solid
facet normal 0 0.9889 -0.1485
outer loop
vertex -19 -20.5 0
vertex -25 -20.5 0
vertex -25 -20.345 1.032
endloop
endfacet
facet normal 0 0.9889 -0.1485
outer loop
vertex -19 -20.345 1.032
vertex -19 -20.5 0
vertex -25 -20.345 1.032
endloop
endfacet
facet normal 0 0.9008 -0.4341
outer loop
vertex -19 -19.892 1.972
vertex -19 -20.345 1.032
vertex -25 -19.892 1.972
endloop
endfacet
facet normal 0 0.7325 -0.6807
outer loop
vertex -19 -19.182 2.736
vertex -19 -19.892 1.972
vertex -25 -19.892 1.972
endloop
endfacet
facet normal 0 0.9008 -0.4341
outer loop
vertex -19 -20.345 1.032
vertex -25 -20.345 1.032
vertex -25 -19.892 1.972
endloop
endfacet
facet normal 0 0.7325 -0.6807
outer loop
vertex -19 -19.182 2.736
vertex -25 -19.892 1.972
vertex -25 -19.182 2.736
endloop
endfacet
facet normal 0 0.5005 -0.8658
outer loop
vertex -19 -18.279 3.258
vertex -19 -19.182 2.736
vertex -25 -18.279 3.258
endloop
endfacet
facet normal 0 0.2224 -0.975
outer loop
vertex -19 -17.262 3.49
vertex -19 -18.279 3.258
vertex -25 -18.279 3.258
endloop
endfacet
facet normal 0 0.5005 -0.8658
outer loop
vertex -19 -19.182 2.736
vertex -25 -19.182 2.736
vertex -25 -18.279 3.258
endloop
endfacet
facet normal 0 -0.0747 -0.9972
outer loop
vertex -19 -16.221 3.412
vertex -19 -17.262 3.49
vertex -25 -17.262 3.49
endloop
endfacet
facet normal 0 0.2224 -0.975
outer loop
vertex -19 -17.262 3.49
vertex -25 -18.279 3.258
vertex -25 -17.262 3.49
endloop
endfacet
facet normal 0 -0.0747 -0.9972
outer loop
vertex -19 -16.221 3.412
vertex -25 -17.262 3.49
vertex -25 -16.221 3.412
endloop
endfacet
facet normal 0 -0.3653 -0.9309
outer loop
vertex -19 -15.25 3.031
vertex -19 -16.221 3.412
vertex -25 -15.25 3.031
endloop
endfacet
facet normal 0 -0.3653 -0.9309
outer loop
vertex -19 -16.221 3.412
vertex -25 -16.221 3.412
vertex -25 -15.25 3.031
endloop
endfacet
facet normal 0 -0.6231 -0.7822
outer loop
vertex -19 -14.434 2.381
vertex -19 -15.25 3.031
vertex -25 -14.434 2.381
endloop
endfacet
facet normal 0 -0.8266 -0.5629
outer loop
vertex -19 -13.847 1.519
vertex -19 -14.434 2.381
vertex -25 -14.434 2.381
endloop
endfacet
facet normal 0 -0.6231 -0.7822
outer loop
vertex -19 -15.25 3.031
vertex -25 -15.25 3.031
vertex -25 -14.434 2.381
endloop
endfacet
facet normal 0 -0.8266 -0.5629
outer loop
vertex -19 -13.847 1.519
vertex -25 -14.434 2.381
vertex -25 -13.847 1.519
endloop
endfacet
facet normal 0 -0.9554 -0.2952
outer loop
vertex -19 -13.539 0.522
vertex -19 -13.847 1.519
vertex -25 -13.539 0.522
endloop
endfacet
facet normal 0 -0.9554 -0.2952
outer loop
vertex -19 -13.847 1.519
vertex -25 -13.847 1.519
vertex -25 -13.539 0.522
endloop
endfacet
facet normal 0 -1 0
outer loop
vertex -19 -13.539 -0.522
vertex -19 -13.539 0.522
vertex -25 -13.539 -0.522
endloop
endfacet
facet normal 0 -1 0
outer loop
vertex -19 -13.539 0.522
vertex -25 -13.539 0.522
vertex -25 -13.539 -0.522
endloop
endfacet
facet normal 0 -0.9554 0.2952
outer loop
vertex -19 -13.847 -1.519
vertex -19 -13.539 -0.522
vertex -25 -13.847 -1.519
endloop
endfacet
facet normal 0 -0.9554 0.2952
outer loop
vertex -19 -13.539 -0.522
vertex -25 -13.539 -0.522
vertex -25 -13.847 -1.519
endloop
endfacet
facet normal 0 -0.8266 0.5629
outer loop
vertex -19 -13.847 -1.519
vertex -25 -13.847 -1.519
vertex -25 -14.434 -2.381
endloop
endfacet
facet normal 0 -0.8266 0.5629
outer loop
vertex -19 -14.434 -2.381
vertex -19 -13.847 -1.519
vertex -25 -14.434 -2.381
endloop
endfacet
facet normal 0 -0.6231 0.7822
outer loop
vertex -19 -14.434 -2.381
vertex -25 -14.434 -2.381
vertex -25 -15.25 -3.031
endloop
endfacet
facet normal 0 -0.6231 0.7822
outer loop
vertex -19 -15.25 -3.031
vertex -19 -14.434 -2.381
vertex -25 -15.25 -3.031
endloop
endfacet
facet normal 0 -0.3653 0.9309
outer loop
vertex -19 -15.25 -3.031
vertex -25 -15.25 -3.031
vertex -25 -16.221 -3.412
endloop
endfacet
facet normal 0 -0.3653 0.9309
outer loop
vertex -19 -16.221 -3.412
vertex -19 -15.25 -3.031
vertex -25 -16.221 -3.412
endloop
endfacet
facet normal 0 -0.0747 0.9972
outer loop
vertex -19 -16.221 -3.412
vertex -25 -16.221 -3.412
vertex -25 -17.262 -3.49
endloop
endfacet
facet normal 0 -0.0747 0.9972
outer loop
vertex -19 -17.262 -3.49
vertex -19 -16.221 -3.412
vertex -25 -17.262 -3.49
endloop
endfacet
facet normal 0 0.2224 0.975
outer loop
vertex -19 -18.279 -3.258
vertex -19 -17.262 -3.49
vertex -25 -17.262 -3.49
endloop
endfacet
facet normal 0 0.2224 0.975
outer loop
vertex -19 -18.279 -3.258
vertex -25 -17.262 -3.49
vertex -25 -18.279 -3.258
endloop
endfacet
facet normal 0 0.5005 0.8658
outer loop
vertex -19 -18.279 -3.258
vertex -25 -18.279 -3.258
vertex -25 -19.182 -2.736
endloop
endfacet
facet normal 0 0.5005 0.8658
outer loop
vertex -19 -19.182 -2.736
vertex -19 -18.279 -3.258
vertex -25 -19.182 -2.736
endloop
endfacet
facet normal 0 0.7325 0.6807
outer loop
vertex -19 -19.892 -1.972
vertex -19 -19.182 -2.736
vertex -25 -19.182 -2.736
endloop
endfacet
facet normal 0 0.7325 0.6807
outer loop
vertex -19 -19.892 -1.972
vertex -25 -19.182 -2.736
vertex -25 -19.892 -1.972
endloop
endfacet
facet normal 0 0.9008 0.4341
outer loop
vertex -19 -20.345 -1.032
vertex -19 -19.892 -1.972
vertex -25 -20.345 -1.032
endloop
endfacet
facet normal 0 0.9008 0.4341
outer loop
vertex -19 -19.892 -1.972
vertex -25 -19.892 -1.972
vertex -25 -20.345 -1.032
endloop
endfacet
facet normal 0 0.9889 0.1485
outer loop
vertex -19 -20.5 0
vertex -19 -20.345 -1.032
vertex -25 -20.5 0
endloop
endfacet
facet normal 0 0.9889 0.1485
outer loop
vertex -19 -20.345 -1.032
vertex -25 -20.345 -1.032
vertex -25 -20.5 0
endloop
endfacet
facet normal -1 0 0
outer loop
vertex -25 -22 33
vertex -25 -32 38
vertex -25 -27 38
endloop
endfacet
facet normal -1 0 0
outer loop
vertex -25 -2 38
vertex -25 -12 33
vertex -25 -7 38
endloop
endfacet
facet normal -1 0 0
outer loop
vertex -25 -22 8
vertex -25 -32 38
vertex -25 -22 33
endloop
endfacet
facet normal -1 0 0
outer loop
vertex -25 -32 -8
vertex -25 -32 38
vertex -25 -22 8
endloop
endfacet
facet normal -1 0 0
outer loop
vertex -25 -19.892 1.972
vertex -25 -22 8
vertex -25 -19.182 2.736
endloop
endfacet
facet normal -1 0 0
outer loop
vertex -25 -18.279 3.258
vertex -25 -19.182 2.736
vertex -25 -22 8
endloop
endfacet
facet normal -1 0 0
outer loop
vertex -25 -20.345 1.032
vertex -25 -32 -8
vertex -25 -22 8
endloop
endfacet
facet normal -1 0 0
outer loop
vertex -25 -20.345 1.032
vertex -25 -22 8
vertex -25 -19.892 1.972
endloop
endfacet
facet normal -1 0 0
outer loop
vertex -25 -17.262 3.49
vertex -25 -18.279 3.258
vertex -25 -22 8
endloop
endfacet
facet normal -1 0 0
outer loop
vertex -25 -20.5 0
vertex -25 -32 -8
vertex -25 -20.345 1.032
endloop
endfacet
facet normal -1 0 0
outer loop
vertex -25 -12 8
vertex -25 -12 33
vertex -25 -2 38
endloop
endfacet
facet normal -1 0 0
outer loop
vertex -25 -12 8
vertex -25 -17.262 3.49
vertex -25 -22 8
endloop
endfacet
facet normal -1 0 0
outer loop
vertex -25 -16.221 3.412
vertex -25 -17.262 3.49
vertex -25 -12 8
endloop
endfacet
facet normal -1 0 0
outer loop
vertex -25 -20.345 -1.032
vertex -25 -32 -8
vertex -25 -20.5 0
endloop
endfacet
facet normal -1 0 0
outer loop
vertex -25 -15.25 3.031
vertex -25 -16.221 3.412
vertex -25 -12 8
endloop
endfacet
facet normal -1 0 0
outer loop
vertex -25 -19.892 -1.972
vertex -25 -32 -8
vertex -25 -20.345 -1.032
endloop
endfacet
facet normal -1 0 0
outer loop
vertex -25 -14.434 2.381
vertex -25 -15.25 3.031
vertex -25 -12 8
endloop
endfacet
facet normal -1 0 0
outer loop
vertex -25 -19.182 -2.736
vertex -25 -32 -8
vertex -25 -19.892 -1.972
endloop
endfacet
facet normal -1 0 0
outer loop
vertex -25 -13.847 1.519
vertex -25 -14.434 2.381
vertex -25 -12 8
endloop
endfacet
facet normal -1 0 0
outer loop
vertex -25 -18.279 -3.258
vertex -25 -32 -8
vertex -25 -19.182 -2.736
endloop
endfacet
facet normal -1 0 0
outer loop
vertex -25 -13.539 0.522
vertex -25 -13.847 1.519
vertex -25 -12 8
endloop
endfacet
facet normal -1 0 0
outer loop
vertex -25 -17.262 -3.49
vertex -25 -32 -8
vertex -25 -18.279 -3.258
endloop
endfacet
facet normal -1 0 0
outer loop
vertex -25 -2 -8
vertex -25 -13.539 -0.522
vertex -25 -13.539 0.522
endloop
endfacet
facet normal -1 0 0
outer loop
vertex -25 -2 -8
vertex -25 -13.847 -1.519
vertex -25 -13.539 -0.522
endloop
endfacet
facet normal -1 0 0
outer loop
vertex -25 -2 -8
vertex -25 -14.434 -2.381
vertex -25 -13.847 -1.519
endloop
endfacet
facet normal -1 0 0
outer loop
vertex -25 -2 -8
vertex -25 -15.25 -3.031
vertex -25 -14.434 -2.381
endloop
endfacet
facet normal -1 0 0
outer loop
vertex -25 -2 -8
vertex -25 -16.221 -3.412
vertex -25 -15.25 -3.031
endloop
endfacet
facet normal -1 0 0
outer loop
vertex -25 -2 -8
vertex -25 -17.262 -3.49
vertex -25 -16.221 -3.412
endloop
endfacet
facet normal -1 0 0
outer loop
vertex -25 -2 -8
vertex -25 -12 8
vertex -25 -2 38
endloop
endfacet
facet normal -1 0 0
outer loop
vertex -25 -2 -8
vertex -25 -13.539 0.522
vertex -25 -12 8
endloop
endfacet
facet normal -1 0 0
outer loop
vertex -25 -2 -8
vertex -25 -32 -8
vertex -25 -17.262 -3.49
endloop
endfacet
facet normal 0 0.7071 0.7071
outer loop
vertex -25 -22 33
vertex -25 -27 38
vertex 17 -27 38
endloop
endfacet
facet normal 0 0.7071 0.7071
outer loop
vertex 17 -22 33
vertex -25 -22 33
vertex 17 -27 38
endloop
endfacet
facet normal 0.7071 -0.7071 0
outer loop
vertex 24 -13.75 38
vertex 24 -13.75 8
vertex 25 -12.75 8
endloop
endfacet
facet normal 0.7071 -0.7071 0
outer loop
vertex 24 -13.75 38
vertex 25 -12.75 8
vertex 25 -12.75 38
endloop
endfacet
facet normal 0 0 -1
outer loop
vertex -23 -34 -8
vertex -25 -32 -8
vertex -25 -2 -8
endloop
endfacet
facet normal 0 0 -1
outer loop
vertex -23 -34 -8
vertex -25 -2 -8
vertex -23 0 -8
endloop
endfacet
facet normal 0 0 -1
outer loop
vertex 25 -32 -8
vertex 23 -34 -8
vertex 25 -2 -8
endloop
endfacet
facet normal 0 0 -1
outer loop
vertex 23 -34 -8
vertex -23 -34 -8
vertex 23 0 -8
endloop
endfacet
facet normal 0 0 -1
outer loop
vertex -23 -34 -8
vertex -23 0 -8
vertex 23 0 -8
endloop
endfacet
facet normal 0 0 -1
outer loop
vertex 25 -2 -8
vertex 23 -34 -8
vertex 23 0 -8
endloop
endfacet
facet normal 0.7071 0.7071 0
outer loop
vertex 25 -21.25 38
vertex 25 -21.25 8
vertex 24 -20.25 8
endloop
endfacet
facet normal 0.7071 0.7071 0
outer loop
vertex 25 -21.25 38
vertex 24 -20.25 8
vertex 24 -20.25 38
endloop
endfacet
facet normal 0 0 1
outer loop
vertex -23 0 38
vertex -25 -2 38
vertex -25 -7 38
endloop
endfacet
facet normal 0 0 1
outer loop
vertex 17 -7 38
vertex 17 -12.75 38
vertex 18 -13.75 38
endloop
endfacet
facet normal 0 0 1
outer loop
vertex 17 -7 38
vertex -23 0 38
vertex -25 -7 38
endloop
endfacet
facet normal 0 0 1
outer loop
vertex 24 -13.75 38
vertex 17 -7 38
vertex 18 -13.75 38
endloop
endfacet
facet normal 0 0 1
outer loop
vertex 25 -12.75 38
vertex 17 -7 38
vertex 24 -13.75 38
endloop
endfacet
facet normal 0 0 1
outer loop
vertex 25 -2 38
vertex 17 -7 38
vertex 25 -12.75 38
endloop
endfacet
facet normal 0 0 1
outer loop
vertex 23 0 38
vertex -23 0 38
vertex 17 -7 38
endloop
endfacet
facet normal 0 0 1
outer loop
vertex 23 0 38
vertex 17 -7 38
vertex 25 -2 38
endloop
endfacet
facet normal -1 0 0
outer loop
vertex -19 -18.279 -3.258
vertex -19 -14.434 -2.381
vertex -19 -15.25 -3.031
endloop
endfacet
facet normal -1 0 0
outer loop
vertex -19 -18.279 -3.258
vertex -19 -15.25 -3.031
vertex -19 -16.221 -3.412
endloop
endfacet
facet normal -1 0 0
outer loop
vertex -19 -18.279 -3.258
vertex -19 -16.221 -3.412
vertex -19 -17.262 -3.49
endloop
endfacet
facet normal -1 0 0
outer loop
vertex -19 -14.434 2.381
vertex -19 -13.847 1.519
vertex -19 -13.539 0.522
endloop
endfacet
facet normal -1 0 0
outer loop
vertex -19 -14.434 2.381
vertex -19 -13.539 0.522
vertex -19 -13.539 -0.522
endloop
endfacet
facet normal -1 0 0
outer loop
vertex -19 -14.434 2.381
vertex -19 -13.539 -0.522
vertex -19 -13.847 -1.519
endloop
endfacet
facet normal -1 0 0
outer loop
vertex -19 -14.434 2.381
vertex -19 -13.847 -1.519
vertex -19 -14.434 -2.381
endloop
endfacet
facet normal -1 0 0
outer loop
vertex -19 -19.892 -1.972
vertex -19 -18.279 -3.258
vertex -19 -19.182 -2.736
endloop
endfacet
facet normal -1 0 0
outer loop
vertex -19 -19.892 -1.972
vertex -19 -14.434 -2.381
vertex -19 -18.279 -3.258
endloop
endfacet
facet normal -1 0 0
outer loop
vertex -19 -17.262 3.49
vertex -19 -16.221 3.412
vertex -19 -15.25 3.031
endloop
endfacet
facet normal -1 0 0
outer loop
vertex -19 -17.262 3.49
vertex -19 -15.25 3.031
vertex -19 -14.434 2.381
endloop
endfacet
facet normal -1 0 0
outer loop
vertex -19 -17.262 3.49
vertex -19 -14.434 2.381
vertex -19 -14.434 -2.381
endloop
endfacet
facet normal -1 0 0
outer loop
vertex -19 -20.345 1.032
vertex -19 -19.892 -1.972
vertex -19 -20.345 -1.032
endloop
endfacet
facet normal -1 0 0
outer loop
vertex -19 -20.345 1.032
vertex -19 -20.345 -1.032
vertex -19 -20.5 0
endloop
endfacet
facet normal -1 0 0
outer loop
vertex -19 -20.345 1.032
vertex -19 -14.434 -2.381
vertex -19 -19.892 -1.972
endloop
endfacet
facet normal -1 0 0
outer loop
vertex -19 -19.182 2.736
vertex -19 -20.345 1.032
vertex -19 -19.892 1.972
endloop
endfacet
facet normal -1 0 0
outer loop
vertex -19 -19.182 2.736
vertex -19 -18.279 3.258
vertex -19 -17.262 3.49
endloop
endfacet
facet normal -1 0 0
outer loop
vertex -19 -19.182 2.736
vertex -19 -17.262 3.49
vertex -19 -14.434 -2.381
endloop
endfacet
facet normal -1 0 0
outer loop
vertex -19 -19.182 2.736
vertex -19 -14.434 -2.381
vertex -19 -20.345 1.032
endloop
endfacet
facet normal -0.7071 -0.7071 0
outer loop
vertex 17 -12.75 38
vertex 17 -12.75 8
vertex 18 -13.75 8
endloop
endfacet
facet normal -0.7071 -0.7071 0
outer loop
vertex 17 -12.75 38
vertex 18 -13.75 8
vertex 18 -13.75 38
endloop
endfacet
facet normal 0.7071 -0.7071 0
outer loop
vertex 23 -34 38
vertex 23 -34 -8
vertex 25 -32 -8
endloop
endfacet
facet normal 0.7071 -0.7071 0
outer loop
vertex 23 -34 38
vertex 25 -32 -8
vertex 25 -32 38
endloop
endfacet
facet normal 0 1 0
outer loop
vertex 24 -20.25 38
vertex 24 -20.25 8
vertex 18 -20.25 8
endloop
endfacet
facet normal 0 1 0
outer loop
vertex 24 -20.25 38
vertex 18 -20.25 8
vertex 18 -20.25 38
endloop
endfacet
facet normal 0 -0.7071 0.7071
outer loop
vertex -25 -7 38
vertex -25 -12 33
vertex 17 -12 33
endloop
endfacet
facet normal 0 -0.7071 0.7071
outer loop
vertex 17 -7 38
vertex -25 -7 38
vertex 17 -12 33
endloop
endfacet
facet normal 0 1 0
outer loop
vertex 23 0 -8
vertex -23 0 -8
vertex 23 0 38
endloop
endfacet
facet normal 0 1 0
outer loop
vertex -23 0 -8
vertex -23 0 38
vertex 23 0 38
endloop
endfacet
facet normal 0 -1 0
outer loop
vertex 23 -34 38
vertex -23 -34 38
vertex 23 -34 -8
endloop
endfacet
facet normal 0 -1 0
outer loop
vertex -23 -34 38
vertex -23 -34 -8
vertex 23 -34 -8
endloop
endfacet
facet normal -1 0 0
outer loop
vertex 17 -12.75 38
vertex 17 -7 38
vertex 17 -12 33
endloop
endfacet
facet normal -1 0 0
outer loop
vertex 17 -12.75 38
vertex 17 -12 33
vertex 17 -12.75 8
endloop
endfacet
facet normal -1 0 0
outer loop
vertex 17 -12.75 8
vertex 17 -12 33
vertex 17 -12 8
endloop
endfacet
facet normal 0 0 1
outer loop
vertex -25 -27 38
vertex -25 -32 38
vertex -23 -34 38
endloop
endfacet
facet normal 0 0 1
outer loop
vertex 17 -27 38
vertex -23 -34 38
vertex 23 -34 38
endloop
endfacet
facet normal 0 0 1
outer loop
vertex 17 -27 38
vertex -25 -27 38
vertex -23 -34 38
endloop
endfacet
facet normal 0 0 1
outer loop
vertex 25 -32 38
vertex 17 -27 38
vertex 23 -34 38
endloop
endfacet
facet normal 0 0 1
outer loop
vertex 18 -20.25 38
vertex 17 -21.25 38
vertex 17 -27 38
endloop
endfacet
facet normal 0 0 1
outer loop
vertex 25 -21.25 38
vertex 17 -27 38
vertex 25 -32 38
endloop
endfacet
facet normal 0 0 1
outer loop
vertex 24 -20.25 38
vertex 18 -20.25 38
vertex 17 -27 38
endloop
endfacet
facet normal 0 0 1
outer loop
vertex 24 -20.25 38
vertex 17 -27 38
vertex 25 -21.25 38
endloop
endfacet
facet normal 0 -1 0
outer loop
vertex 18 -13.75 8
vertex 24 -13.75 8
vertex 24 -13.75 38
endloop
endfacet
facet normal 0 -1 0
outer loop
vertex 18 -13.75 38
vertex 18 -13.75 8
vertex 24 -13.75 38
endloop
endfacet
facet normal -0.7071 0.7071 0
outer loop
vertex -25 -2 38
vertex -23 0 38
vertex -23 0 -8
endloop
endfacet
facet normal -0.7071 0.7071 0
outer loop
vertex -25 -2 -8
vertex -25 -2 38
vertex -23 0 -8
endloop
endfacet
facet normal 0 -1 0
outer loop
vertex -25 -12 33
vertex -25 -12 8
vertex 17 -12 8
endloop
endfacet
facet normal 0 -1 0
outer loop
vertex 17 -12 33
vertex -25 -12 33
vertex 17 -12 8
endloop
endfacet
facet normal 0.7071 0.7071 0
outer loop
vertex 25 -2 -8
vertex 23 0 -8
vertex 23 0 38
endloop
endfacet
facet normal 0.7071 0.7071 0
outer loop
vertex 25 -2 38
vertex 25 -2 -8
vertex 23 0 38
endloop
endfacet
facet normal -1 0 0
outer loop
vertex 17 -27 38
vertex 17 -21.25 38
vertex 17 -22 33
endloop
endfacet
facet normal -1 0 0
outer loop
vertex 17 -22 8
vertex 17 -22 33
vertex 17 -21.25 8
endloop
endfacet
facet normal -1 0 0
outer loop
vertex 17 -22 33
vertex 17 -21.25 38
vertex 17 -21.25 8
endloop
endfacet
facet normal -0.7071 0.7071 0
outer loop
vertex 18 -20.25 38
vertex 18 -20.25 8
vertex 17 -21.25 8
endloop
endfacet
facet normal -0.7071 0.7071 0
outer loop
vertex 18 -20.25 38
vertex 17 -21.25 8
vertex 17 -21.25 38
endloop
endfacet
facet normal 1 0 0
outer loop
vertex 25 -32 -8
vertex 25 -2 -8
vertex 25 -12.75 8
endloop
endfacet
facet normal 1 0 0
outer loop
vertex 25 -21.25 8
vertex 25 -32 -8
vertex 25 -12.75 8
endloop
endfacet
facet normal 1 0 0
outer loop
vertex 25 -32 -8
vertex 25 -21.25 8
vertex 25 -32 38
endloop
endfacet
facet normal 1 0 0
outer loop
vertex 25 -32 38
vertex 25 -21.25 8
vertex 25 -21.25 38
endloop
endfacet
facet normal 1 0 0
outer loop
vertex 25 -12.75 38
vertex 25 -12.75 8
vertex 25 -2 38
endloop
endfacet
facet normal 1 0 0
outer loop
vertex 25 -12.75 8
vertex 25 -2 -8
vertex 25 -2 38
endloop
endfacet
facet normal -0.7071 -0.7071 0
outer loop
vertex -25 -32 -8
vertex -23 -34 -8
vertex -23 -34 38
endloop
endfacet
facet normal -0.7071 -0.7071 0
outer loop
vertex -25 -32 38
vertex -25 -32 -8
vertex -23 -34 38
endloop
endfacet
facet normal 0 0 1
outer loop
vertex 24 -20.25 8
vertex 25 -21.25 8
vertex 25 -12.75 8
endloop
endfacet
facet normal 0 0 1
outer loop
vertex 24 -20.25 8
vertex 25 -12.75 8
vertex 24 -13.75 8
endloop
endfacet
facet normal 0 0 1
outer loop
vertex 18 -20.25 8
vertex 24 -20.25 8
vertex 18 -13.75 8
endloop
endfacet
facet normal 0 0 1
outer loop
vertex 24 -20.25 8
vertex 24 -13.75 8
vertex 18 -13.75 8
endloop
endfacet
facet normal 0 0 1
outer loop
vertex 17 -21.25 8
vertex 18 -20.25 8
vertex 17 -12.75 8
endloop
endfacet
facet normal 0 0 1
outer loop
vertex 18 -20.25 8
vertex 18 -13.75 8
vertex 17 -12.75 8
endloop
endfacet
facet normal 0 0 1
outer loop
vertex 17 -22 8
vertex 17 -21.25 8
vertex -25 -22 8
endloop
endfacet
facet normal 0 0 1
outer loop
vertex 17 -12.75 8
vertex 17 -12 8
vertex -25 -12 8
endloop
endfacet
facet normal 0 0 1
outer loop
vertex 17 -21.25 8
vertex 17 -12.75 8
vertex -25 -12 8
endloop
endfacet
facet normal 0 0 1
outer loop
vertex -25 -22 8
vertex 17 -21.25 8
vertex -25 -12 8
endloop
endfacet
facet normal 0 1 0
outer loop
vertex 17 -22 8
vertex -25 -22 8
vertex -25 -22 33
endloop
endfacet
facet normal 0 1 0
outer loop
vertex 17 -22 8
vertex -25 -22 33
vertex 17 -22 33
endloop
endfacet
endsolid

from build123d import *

# Parameters (mm, degrees)
F1_DEPTH = 34
F2_W     = 6.5
F2_H     = 30
F3_DEPTH = 8
F4_R     = 3.5
F5_DEPTH = 6
F6_W     = 42
F6_H     = 12
F7_DEPTH = 30
F8_SIZE  = 5
F9_SIZE  = 2
F10_SIZE = 1


with BuildPart() as f1:
    # F0 (on Front) → F1 (new body)
    with BuildSketch(Plane.XZ):
        Polygon((-20, 8), (-25, 8), (-25, -8), (25, -8), (25, 38), (17, 38), (17, 8), align=None)
    extrude(amount=F1_DEPTH)

    # F2 (on face) → F3 (cut, through all)
    with BuildSketch(Plane.YZ.offset(25)):
        with Locations((-17, 23)):
            Rectangle(F2_W, F2_H)
    extrude(amount=-F3_DEPTH, mode=Mode.SUBTRACT)

    # F4 (on face) → F5 (cut)
    with BuildSketch(Plane(origin=(-25, 0, 0), x_dir=(0, -1, 0), z_dir=(-1, 0, 0))):
        with Locations((17, 0)):
            Circle(F4_R)
    extrude(amount=-F5_DEPTH, mode=Mode.SUBTRACT)

    # F6 (on face) → F7 (join, through all)
    with BuildSketch(Plane.XY.offset(8)):
        with Locations((-4, -28)):
            Rectangle(F6_W, F6_H)
        with Locations((-4, -6)):
            Rectangle(F6_W, F6_H)
    extrude(amount=F7_DEPTH)

    # F8
    f8_edges = [f1.edges().sort_by_distance(p)[0] for p in [
        (-4, -22, 38),
        (-4, -12, 38),
    ]]
    chamfer(f8_edges, length=F8_SIZE)

    # F9
    f9_edges = [f1.edges().sort_by_distance(p)[0] for p in [
        (25, -34, 15),
        (25, 0, 15),
        (-25, -34, 15),
        (-25, 0, 15),
    ]]
    chamfer(f9_edges, length=F9_SIZE)

    # F10
    f10_edges = [f1.edges().sort_by_distance(p)[0] for p in [
        (17, -13.75, 23),
        (17, -20.25, 23),
        (25, -13.75, 23),
        (25, -20.25, 23),
    ]]
    chamfer(f10_edges, length=F10_SIZE)


solid = f1.part
